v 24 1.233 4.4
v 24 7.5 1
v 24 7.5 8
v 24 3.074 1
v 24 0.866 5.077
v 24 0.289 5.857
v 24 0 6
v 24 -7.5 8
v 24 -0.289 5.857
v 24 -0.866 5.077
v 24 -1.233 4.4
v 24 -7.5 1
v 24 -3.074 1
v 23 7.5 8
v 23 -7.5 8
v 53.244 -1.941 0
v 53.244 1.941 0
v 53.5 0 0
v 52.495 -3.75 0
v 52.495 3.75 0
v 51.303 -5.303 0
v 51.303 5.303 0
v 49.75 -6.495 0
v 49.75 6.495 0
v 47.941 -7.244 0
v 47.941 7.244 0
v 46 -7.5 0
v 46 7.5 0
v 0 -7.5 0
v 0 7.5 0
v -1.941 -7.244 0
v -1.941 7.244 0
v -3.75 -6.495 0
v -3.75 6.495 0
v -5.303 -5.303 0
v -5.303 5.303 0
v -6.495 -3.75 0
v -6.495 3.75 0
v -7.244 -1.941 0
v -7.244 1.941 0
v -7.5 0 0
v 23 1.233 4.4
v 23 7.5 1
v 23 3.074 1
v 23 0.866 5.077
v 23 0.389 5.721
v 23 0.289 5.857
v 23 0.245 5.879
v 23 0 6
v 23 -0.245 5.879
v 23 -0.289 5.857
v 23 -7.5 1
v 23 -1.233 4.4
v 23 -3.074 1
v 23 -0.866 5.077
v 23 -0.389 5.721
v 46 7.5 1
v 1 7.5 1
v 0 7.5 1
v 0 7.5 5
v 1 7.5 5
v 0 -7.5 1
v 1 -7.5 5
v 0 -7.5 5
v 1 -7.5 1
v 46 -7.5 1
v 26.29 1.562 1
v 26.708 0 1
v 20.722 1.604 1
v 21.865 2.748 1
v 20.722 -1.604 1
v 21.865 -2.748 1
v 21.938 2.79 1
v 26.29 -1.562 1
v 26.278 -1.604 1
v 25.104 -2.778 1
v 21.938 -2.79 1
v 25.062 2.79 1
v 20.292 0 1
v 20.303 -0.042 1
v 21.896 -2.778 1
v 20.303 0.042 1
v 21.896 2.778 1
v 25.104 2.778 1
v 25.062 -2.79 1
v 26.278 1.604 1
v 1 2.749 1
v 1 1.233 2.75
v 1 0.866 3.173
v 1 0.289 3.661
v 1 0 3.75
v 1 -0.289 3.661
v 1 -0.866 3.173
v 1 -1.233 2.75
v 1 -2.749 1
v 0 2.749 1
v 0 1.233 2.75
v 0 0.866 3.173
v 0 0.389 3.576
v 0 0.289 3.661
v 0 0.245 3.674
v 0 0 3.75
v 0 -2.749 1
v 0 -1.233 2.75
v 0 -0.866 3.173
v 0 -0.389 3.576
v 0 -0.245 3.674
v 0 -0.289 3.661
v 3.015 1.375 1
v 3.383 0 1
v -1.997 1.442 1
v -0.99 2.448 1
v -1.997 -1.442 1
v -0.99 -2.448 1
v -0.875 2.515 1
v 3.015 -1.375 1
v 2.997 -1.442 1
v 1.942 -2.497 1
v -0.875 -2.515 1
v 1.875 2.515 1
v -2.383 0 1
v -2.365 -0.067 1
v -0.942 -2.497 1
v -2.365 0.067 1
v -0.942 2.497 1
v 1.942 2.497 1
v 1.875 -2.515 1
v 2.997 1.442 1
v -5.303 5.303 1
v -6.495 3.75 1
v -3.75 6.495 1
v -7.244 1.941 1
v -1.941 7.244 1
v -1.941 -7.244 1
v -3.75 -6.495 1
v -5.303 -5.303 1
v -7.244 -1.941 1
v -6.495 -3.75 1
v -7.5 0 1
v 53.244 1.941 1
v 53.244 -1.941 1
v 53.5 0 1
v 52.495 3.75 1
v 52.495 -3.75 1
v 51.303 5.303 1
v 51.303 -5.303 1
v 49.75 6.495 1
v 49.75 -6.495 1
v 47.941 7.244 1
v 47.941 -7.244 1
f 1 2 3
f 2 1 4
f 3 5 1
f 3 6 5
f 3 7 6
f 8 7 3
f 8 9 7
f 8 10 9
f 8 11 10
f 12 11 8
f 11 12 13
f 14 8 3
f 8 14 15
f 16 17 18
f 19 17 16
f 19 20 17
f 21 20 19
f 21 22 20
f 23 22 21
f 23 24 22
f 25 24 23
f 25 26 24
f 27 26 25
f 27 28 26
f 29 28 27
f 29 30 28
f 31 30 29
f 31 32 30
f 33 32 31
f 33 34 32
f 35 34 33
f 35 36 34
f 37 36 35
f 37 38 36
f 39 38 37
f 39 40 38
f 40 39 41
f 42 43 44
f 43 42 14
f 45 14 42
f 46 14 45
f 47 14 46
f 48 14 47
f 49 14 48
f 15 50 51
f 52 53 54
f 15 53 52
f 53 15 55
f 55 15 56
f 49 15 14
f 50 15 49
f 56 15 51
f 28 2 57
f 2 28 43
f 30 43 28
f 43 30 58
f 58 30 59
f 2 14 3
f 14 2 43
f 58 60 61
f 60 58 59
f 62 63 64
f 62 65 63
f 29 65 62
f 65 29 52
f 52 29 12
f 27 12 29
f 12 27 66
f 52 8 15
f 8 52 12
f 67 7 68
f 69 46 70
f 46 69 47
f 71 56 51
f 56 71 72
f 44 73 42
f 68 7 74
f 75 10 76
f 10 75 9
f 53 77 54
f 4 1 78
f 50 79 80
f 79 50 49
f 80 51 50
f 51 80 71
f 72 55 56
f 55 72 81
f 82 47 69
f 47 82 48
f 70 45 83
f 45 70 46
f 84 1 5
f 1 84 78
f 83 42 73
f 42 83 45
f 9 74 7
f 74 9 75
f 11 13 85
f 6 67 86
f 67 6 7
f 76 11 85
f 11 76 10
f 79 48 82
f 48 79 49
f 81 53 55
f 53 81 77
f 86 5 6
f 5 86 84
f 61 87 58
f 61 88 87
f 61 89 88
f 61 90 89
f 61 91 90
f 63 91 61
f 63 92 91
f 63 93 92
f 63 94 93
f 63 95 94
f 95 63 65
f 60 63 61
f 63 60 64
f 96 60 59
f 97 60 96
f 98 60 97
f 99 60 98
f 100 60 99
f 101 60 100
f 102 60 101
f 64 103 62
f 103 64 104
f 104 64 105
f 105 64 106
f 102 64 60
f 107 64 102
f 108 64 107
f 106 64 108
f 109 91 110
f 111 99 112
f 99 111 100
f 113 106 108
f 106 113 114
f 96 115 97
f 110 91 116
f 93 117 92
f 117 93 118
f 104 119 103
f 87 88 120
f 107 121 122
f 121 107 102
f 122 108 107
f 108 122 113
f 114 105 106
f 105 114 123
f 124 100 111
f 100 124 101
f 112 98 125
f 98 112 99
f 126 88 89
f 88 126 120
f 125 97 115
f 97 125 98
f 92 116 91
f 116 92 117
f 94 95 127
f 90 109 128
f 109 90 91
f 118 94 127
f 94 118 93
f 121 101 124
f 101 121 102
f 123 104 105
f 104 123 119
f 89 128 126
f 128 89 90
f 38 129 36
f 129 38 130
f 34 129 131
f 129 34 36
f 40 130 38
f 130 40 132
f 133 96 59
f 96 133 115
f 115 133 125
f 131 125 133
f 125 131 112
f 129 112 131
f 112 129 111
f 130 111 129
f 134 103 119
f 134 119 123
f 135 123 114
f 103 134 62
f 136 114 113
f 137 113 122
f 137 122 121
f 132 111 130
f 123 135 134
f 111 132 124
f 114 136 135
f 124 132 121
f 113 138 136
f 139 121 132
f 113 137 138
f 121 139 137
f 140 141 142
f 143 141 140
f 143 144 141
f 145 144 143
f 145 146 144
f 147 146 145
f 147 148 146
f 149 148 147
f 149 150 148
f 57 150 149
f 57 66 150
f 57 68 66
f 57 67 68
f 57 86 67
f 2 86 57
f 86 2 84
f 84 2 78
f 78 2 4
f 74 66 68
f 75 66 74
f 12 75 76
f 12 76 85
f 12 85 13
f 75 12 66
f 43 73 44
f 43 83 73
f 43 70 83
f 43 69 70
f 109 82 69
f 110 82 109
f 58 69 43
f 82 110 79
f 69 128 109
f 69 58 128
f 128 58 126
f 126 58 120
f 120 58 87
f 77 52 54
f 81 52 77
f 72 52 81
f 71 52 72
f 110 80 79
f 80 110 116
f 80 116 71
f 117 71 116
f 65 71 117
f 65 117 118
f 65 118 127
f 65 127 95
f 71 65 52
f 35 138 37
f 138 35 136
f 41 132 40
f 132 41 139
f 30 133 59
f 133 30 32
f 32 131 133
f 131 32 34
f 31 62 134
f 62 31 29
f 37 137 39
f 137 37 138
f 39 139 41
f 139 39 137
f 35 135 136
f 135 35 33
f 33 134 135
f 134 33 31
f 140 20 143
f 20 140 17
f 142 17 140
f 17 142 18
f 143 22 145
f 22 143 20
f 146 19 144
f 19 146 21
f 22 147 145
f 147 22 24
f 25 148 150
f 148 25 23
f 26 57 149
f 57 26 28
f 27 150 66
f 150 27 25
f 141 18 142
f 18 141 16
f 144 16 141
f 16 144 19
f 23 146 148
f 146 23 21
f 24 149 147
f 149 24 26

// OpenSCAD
//Molle hanger


width = 15;
thickness = 1;
length1 = 30;

limiter_width = 8;
limiter_thickness = 1;

total_length = 2 * length1 + limiter_thickness;

module limiter(limiter_width=limiter_width) {
    translate([0, -0.5*width, 0]) cube([limiter_thickness, width, limiter_width]);
    translate([0.5 * limiter_thickness, 0, 0]) cylinder(h=0.75*limiter_width, d1=0.5*width, d2=limiter_thickness);
}

cylinder(d=width, h=thickness);
translate([total_length-width, 0, 0]) cylinder(d=width, h=thickness);
translate([0, -0.5*width, 0]) cube([total_length-width, width, thickness]);

translate([0.5 * (total_length - width), 0, 0]) limiter();
limiter(5);
//translate([0.5 * (total_length - width), -0.5 * width, 0]) cube([limiter_thickness, width, limiter_width]);
//translate([0.5 * (total_length - width + limiter_thickness), 0, 0]) cylinder(h=0.75*limiter_width, d1=0.5*width, d2=limiter_thickness);
